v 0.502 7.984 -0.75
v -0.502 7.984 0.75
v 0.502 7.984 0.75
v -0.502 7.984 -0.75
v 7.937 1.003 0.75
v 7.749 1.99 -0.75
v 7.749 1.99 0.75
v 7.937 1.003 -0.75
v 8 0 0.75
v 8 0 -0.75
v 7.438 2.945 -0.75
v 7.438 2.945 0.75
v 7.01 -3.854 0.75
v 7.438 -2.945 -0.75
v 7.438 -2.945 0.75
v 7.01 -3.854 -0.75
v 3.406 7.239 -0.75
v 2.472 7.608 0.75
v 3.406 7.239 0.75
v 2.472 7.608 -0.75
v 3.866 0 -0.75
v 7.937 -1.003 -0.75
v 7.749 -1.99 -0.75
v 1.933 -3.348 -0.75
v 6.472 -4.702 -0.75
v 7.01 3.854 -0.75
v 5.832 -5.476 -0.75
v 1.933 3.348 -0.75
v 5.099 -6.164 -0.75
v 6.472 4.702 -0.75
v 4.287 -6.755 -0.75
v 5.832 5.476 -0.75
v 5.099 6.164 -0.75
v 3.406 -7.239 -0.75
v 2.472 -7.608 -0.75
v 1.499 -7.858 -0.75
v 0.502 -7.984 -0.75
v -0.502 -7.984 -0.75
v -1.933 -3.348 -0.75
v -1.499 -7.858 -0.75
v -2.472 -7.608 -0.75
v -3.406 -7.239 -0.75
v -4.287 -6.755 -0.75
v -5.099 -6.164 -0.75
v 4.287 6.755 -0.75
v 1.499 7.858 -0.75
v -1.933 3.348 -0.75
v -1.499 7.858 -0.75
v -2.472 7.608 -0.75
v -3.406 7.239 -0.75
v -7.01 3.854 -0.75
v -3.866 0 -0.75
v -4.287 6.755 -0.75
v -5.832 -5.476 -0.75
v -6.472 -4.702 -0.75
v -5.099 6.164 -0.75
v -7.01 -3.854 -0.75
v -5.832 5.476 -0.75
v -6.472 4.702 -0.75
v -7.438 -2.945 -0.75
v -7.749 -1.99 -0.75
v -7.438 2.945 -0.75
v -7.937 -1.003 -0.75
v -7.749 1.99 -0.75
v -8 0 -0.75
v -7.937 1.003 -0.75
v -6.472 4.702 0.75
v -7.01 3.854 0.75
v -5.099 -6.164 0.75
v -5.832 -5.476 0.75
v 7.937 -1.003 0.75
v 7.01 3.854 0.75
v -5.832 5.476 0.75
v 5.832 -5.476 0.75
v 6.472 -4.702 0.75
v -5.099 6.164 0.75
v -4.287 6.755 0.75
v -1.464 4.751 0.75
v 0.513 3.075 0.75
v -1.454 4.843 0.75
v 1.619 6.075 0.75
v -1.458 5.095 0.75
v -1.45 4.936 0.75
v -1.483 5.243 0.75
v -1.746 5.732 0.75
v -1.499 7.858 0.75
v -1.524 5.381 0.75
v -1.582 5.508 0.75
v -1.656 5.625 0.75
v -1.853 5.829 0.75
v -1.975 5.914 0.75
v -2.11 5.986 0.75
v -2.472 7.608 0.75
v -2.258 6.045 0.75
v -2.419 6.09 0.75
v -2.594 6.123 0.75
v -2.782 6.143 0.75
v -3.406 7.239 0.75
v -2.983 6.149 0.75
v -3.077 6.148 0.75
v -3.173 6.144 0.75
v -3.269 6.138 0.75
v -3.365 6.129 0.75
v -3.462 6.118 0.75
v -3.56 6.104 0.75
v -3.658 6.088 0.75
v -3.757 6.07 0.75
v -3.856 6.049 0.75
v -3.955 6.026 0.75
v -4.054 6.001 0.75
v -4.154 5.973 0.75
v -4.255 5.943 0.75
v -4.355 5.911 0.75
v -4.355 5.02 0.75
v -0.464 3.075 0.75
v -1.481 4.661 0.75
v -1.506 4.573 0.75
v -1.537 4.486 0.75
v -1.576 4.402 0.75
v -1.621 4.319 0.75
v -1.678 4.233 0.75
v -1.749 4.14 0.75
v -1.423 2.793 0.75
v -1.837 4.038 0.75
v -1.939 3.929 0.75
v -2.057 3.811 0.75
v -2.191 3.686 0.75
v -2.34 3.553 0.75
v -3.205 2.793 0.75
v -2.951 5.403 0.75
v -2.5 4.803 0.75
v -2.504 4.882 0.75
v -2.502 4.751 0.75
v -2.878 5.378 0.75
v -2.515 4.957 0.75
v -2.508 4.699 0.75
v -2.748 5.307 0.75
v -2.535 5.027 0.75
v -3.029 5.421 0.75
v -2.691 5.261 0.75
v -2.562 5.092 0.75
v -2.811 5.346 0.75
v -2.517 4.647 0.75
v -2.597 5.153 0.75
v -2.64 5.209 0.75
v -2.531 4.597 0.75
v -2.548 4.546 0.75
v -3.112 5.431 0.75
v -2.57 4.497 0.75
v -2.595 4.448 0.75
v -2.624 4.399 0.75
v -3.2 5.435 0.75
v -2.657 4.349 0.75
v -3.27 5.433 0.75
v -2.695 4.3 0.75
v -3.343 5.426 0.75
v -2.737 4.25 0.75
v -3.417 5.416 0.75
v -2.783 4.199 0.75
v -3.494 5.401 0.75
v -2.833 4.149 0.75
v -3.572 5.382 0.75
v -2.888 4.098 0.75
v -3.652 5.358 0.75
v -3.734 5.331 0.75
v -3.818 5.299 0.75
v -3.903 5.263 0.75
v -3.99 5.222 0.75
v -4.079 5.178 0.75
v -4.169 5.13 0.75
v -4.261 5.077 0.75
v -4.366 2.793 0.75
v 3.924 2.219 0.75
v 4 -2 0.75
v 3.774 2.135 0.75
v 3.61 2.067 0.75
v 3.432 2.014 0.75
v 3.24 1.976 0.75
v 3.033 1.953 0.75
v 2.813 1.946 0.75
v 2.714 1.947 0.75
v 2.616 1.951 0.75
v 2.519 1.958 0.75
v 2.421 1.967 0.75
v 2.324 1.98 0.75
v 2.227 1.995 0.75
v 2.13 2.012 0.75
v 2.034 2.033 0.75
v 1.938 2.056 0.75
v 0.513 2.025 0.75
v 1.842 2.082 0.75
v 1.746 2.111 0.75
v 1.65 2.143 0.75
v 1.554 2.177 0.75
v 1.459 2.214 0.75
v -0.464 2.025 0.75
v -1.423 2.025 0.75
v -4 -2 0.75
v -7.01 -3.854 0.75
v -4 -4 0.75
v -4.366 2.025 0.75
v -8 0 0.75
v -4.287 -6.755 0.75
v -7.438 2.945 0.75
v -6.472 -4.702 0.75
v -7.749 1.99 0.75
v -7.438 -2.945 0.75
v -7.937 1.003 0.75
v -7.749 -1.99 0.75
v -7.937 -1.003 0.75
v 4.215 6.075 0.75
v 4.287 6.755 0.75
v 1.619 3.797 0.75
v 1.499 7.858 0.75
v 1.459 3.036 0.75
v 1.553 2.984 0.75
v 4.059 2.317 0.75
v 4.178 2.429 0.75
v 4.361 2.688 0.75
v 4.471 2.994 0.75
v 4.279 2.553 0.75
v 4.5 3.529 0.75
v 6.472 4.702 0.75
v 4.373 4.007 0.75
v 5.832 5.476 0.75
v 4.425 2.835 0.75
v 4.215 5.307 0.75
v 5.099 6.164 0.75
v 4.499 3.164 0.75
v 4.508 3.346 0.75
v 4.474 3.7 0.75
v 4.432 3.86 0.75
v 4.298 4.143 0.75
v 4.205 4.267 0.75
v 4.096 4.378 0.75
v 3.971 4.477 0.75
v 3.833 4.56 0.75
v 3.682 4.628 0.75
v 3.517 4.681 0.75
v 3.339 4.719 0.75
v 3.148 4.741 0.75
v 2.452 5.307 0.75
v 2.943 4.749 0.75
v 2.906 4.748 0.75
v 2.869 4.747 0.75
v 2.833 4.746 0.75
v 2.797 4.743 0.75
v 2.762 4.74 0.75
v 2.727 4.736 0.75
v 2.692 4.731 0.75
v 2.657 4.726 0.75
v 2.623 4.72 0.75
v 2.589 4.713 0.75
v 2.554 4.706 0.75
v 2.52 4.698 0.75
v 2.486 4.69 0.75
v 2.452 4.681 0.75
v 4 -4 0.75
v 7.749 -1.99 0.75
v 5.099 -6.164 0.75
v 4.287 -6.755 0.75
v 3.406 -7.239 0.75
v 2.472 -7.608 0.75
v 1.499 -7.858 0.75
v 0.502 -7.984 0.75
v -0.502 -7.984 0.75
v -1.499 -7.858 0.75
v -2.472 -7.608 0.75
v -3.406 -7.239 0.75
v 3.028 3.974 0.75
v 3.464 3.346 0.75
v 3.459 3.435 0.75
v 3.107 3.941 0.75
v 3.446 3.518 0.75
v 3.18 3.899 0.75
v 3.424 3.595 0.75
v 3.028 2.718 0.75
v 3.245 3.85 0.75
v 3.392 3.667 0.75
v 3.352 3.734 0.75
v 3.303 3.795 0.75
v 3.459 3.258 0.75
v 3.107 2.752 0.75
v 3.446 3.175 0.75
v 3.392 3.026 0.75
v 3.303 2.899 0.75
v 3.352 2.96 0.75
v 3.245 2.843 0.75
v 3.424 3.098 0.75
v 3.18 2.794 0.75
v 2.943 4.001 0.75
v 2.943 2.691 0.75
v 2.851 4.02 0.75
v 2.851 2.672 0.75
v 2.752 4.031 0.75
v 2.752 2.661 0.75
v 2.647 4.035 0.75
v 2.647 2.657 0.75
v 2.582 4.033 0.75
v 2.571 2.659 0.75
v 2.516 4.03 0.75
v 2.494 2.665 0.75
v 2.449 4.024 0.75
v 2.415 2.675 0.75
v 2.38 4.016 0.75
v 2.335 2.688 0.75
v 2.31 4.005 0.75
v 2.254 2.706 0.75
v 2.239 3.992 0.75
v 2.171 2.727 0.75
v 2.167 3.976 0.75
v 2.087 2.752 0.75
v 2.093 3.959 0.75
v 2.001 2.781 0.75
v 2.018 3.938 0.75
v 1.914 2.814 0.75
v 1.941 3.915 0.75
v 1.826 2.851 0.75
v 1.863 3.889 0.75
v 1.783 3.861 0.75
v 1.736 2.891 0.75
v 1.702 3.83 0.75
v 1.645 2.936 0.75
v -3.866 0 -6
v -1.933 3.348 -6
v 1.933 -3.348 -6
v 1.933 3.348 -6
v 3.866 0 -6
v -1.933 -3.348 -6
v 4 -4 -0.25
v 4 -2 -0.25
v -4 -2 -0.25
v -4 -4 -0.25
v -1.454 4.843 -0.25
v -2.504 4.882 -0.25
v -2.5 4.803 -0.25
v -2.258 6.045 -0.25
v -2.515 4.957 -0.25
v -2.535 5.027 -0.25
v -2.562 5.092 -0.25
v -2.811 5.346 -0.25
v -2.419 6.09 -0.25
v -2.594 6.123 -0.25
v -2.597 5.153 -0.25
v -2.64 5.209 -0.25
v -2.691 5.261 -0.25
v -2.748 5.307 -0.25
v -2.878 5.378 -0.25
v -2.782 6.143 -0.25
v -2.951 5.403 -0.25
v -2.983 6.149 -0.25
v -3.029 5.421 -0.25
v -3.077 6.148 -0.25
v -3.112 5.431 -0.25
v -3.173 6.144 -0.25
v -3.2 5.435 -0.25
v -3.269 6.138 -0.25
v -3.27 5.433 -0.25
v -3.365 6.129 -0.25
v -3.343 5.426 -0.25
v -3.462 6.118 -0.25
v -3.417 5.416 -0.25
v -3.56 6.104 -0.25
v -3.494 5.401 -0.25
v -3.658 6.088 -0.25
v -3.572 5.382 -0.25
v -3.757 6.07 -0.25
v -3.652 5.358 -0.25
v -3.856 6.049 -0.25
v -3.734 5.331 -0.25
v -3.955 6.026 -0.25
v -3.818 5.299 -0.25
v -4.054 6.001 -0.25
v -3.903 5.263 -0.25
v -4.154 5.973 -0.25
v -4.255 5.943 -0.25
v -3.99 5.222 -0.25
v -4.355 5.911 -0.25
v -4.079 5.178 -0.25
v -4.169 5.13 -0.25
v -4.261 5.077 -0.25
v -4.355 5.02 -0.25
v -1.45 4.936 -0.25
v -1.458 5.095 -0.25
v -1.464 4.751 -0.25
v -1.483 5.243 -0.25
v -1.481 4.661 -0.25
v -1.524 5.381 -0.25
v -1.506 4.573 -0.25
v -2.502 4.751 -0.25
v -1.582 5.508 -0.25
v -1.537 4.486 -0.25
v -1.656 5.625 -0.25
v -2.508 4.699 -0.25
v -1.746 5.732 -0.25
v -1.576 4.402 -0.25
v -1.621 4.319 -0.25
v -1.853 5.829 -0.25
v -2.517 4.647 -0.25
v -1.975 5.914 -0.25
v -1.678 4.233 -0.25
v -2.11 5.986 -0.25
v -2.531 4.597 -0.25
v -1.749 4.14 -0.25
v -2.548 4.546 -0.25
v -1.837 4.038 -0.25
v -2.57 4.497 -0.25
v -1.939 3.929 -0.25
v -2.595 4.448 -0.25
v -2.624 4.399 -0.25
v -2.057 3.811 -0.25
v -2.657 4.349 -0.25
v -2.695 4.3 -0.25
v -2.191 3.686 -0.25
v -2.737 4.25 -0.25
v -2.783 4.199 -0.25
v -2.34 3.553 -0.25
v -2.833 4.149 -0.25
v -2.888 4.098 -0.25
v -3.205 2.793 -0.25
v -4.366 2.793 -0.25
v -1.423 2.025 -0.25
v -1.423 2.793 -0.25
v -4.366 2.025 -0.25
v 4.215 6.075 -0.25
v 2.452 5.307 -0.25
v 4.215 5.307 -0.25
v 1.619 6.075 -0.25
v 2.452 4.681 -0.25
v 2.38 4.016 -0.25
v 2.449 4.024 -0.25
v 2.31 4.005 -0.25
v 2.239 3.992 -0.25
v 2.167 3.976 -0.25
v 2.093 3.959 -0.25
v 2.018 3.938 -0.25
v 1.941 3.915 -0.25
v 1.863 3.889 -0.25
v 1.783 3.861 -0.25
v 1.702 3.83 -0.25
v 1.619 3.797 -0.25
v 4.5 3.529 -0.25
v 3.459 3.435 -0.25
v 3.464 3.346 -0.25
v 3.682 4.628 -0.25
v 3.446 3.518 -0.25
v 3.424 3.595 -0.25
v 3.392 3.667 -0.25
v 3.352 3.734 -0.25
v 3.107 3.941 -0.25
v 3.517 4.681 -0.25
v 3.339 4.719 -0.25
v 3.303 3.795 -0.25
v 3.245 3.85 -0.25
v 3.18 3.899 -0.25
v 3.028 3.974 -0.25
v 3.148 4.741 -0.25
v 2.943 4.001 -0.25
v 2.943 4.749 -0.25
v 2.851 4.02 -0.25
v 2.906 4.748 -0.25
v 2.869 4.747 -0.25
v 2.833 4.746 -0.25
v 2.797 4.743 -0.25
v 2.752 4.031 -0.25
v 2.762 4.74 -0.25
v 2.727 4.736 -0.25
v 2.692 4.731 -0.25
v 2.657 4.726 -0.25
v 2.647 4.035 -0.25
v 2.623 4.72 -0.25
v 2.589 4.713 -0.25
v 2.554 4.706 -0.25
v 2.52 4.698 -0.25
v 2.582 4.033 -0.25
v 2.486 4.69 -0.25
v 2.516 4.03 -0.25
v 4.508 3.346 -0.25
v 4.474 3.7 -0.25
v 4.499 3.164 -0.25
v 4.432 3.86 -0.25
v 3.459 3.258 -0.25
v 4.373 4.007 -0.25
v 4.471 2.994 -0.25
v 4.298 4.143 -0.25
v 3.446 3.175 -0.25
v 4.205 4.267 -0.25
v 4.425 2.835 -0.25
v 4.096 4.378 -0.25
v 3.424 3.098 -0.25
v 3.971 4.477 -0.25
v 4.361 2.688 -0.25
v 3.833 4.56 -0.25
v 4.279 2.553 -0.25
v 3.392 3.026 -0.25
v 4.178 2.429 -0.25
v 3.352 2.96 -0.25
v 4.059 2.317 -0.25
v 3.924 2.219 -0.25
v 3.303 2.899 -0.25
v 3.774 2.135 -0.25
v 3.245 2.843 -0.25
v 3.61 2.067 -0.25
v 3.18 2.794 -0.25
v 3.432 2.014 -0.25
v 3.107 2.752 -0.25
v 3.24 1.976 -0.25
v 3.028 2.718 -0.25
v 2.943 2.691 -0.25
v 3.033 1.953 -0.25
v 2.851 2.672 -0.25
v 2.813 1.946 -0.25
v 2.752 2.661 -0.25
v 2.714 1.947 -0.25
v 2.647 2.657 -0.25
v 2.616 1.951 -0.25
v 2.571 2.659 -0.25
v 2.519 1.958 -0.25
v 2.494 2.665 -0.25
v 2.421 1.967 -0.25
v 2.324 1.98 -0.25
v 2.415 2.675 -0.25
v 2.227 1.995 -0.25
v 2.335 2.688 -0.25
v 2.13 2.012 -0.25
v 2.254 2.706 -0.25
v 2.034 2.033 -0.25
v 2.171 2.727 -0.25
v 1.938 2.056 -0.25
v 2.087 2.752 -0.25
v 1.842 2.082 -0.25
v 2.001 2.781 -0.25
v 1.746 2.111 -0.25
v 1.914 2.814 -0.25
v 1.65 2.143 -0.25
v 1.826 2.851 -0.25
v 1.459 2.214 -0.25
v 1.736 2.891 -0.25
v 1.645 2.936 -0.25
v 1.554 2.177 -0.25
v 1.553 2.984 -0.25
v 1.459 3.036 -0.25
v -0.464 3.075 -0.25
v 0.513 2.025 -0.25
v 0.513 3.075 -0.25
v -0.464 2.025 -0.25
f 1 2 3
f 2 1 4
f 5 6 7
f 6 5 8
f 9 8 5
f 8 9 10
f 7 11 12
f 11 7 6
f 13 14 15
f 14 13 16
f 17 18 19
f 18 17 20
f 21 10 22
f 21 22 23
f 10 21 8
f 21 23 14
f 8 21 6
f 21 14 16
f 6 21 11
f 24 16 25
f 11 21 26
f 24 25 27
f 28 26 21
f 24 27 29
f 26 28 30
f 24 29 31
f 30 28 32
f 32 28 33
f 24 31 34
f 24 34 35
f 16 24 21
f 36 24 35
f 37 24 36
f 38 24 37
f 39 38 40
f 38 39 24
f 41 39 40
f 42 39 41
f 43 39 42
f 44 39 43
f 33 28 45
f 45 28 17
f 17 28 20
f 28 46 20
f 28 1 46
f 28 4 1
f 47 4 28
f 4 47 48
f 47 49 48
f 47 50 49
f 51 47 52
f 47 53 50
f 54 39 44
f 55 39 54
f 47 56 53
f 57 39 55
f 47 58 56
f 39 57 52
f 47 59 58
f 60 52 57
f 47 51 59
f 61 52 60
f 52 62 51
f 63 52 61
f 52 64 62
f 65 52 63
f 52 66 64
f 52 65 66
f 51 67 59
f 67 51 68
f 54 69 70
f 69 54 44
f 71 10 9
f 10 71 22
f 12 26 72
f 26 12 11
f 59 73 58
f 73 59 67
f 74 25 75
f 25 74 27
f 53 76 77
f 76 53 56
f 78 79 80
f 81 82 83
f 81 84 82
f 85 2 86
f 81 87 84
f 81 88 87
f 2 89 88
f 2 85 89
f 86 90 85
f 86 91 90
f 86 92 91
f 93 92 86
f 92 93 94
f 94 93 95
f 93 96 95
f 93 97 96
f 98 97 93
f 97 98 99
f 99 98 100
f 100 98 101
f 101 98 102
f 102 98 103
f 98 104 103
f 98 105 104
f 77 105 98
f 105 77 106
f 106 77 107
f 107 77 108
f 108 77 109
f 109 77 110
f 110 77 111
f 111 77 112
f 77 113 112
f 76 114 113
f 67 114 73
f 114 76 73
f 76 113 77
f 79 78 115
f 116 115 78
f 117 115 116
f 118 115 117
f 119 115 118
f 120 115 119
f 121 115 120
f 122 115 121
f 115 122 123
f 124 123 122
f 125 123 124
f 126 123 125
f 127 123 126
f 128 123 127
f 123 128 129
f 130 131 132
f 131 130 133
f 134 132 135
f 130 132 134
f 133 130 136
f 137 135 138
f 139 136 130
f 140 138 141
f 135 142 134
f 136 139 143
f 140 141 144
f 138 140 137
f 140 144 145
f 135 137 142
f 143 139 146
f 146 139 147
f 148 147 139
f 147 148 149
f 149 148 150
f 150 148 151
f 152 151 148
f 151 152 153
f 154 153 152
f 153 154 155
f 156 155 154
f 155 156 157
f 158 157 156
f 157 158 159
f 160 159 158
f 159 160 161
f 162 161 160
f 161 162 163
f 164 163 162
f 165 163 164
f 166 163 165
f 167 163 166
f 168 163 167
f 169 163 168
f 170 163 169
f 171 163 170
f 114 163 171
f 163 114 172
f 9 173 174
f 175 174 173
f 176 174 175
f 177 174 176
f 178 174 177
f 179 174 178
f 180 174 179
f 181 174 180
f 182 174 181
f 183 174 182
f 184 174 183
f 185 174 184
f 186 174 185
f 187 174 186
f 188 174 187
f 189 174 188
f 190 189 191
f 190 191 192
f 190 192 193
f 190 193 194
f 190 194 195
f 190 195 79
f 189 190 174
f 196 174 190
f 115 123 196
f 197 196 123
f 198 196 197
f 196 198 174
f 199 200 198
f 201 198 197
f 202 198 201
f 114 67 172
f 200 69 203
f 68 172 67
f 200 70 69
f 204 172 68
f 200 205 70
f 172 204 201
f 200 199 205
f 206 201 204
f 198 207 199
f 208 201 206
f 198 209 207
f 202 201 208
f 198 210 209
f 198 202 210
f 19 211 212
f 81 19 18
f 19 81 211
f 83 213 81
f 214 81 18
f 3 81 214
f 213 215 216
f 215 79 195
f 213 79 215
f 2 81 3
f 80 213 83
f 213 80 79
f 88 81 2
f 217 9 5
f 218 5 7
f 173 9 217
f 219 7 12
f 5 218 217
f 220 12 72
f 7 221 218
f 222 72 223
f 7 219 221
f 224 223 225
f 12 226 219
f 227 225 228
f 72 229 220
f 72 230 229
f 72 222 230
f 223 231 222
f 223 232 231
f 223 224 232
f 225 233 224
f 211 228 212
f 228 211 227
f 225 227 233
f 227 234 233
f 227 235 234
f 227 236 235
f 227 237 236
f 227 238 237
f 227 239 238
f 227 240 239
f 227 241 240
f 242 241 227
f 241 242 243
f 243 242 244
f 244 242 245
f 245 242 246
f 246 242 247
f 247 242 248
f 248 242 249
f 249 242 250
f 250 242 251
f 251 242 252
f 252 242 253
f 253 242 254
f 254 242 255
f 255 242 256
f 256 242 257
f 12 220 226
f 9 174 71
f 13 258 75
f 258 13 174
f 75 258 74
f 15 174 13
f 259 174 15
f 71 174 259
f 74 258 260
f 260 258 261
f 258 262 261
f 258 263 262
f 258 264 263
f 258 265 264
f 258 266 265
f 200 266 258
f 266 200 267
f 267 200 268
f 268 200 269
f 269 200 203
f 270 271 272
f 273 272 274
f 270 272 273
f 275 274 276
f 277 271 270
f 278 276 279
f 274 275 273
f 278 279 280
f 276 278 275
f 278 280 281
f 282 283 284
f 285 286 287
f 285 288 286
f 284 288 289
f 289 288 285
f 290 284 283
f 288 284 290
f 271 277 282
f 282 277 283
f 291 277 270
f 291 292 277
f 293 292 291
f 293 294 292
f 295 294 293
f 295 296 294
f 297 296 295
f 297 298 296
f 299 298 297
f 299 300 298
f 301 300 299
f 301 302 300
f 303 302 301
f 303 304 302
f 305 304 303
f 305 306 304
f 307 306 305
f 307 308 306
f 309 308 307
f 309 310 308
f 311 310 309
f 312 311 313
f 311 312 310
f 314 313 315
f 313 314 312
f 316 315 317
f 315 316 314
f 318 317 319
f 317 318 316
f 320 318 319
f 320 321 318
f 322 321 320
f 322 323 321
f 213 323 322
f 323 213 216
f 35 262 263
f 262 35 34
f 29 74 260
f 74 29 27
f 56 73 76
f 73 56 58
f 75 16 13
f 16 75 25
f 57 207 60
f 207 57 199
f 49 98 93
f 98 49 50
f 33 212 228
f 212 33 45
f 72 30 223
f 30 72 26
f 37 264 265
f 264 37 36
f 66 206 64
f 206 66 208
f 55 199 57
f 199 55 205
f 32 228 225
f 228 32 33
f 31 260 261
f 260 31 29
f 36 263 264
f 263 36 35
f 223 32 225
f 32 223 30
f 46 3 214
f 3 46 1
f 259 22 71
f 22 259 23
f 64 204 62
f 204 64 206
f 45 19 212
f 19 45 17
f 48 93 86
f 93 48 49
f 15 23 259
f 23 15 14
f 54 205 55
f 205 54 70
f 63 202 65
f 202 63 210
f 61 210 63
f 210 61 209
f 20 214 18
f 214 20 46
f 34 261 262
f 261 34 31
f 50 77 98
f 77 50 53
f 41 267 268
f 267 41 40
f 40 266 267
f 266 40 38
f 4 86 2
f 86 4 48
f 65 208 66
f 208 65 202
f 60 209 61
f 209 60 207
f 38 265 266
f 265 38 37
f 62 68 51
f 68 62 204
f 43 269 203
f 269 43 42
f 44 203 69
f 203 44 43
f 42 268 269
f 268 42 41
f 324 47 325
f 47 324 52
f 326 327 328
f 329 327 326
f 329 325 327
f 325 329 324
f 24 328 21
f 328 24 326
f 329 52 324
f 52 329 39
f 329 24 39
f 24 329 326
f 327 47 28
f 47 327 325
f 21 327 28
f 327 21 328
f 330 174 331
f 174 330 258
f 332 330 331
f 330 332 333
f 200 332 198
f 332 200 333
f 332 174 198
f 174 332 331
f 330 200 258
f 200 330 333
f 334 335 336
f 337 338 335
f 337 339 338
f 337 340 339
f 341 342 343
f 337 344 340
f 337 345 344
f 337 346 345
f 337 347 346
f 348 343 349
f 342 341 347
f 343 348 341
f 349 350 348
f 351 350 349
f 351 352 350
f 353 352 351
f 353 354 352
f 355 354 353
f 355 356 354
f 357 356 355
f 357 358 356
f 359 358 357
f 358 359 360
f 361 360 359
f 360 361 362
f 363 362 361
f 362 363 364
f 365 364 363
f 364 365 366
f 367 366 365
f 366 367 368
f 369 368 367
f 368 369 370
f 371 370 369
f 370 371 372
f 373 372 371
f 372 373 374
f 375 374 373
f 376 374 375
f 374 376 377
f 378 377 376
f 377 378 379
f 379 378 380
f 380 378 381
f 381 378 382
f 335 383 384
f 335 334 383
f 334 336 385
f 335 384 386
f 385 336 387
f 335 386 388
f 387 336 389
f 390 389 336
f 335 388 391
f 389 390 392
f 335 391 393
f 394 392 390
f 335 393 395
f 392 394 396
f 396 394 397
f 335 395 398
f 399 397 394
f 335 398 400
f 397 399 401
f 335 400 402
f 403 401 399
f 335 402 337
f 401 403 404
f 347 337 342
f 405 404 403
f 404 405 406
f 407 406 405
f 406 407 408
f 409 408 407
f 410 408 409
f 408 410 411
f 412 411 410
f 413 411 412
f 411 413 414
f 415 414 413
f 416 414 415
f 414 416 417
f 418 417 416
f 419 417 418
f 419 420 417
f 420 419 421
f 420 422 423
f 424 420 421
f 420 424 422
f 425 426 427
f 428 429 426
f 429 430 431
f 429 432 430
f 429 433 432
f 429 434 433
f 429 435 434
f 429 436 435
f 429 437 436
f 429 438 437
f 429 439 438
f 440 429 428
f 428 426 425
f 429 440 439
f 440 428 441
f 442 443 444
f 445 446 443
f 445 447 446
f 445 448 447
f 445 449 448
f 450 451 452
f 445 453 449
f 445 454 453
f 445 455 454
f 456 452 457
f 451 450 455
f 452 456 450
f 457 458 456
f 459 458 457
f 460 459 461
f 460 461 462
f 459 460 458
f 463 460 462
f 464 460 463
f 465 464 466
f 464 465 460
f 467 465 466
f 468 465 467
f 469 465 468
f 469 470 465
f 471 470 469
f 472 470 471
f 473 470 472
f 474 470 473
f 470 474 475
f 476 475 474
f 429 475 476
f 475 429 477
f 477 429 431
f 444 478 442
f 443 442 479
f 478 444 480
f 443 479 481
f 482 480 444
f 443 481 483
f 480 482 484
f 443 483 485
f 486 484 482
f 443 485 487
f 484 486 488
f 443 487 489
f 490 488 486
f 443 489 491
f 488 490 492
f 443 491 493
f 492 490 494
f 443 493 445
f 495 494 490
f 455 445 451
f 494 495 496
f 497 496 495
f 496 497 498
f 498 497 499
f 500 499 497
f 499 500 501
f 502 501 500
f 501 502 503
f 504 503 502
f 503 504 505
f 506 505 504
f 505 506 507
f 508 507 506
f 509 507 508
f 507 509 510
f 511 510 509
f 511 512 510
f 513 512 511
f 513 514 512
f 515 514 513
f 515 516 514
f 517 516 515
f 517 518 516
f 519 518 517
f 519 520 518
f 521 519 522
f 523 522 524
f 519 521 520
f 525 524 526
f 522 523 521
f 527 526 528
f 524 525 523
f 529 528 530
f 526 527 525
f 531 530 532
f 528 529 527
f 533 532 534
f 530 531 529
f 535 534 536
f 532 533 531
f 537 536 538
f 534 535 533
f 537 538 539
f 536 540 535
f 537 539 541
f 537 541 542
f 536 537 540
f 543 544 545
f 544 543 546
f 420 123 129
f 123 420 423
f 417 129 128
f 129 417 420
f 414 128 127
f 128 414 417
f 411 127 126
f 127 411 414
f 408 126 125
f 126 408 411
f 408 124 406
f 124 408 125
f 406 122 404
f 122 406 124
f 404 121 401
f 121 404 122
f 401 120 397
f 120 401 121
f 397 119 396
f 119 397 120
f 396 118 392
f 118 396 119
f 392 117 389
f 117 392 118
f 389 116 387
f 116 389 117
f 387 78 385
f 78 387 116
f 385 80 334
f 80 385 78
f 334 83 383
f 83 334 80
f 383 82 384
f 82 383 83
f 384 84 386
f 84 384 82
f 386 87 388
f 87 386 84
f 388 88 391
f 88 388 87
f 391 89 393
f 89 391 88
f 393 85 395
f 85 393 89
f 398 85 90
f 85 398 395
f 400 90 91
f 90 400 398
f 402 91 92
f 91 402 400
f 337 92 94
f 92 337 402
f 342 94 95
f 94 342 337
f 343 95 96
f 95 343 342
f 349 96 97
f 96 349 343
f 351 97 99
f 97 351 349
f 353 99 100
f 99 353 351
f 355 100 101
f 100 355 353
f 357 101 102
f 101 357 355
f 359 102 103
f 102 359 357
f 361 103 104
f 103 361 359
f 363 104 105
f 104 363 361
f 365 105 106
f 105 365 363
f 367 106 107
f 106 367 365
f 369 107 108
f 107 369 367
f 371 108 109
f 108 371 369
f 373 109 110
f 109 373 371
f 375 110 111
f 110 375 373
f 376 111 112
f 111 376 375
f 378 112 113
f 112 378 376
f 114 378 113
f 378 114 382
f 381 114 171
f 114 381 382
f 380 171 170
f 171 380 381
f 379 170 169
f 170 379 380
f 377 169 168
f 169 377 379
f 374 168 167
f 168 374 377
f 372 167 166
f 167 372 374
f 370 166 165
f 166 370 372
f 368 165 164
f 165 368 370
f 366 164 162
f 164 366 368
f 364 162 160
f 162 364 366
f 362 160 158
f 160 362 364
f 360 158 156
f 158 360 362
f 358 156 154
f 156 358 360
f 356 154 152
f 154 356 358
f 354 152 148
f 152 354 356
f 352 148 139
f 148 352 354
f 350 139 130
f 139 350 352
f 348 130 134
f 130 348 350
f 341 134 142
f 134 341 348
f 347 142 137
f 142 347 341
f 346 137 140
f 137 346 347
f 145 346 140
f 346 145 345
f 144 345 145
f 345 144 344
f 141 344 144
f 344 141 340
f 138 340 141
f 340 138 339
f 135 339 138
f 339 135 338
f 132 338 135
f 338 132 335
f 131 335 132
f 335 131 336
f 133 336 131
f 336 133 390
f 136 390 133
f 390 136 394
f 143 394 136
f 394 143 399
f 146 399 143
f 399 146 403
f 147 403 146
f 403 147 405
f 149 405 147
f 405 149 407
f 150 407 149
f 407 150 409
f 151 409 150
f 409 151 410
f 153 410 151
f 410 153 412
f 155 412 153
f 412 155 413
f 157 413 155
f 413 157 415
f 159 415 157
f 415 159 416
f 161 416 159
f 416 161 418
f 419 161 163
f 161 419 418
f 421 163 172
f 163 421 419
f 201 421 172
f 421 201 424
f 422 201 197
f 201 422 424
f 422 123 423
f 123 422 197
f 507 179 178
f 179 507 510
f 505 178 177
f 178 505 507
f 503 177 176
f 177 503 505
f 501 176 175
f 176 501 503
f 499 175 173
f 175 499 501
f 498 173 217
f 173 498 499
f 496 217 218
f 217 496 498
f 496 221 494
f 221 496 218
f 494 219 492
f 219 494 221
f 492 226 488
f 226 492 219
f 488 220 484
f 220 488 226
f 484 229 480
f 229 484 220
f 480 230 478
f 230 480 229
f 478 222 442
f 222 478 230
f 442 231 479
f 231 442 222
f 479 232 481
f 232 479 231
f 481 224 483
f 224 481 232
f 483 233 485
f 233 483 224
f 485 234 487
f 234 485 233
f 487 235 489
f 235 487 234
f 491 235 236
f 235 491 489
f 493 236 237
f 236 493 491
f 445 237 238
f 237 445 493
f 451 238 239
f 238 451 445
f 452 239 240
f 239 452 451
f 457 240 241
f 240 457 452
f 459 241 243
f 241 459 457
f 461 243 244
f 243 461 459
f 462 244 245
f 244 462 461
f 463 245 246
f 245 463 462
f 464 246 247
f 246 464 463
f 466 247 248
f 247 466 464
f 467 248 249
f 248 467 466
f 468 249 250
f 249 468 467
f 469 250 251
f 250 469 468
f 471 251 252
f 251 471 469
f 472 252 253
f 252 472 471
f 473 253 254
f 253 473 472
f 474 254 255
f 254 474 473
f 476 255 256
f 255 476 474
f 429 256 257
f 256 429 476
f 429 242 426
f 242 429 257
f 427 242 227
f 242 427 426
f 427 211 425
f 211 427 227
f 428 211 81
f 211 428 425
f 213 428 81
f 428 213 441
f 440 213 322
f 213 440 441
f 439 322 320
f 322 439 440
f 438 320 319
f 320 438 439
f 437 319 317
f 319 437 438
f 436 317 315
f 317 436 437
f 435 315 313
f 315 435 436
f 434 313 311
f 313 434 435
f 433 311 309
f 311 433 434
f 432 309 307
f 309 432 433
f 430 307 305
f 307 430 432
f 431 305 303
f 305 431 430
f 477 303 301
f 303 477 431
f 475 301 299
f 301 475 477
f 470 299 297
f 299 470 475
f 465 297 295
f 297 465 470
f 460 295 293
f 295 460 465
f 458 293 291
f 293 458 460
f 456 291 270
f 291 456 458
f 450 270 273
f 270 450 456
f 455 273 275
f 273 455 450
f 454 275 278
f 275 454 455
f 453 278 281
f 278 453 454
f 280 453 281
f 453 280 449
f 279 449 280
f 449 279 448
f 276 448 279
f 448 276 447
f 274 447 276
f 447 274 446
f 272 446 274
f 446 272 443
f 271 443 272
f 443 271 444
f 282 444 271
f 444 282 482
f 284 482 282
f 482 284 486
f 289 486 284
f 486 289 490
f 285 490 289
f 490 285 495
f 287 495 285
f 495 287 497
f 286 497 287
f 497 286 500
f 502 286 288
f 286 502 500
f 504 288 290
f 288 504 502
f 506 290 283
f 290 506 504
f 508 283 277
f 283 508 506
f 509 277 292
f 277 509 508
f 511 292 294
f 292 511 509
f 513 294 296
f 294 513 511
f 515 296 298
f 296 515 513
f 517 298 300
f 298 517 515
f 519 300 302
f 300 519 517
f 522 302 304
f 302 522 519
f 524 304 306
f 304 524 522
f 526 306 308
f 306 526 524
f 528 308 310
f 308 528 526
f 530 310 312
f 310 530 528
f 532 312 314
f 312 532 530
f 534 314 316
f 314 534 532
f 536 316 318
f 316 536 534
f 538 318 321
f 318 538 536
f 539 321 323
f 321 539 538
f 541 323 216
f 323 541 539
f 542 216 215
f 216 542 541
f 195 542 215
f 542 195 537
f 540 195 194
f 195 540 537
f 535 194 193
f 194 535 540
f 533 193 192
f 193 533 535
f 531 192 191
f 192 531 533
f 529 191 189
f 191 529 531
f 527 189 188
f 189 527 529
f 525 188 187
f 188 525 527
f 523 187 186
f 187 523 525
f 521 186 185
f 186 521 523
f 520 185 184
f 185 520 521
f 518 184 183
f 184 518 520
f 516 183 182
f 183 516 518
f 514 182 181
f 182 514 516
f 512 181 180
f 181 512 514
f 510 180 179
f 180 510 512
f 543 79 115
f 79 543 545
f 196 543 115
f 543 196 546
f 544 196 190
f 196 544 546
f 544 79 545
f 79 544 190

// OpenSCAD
$fn = 50;


difference() {
	union() {
		translate(v = [0, 0, -0.7500000000]) {
			cylinder(h = 1.5000000000, r = 8.0000000000);
		}
		translate(v = [0, 0, -6]) {
			linear_extrude(height = 6) {
				polygon(points = [[3.8658550000, 0.0000000000], [1.9329275000, 3.3479286373], [-1.9329275000, 3.3479286373], [-3.8658550000, 0.0000000000], [-1.9329275000, -3.3479286373], [1.9329275000, -3.3479286373]]);
			}
		}
	}
	union() {
		#translate(v = [-4.0000000000, -4.0000000000, -0.2500000000]) {
			cube(size = [8, 2, 1]);
		}
		#translate(v = [0, 4, -0.2500000000]) {
			linear_extrude(height = 1) {
				text(font = "SegoiUI:Bold", halign = "center", size = 4, text = "2.5", valign = "center");
			}
		}
	}
}
